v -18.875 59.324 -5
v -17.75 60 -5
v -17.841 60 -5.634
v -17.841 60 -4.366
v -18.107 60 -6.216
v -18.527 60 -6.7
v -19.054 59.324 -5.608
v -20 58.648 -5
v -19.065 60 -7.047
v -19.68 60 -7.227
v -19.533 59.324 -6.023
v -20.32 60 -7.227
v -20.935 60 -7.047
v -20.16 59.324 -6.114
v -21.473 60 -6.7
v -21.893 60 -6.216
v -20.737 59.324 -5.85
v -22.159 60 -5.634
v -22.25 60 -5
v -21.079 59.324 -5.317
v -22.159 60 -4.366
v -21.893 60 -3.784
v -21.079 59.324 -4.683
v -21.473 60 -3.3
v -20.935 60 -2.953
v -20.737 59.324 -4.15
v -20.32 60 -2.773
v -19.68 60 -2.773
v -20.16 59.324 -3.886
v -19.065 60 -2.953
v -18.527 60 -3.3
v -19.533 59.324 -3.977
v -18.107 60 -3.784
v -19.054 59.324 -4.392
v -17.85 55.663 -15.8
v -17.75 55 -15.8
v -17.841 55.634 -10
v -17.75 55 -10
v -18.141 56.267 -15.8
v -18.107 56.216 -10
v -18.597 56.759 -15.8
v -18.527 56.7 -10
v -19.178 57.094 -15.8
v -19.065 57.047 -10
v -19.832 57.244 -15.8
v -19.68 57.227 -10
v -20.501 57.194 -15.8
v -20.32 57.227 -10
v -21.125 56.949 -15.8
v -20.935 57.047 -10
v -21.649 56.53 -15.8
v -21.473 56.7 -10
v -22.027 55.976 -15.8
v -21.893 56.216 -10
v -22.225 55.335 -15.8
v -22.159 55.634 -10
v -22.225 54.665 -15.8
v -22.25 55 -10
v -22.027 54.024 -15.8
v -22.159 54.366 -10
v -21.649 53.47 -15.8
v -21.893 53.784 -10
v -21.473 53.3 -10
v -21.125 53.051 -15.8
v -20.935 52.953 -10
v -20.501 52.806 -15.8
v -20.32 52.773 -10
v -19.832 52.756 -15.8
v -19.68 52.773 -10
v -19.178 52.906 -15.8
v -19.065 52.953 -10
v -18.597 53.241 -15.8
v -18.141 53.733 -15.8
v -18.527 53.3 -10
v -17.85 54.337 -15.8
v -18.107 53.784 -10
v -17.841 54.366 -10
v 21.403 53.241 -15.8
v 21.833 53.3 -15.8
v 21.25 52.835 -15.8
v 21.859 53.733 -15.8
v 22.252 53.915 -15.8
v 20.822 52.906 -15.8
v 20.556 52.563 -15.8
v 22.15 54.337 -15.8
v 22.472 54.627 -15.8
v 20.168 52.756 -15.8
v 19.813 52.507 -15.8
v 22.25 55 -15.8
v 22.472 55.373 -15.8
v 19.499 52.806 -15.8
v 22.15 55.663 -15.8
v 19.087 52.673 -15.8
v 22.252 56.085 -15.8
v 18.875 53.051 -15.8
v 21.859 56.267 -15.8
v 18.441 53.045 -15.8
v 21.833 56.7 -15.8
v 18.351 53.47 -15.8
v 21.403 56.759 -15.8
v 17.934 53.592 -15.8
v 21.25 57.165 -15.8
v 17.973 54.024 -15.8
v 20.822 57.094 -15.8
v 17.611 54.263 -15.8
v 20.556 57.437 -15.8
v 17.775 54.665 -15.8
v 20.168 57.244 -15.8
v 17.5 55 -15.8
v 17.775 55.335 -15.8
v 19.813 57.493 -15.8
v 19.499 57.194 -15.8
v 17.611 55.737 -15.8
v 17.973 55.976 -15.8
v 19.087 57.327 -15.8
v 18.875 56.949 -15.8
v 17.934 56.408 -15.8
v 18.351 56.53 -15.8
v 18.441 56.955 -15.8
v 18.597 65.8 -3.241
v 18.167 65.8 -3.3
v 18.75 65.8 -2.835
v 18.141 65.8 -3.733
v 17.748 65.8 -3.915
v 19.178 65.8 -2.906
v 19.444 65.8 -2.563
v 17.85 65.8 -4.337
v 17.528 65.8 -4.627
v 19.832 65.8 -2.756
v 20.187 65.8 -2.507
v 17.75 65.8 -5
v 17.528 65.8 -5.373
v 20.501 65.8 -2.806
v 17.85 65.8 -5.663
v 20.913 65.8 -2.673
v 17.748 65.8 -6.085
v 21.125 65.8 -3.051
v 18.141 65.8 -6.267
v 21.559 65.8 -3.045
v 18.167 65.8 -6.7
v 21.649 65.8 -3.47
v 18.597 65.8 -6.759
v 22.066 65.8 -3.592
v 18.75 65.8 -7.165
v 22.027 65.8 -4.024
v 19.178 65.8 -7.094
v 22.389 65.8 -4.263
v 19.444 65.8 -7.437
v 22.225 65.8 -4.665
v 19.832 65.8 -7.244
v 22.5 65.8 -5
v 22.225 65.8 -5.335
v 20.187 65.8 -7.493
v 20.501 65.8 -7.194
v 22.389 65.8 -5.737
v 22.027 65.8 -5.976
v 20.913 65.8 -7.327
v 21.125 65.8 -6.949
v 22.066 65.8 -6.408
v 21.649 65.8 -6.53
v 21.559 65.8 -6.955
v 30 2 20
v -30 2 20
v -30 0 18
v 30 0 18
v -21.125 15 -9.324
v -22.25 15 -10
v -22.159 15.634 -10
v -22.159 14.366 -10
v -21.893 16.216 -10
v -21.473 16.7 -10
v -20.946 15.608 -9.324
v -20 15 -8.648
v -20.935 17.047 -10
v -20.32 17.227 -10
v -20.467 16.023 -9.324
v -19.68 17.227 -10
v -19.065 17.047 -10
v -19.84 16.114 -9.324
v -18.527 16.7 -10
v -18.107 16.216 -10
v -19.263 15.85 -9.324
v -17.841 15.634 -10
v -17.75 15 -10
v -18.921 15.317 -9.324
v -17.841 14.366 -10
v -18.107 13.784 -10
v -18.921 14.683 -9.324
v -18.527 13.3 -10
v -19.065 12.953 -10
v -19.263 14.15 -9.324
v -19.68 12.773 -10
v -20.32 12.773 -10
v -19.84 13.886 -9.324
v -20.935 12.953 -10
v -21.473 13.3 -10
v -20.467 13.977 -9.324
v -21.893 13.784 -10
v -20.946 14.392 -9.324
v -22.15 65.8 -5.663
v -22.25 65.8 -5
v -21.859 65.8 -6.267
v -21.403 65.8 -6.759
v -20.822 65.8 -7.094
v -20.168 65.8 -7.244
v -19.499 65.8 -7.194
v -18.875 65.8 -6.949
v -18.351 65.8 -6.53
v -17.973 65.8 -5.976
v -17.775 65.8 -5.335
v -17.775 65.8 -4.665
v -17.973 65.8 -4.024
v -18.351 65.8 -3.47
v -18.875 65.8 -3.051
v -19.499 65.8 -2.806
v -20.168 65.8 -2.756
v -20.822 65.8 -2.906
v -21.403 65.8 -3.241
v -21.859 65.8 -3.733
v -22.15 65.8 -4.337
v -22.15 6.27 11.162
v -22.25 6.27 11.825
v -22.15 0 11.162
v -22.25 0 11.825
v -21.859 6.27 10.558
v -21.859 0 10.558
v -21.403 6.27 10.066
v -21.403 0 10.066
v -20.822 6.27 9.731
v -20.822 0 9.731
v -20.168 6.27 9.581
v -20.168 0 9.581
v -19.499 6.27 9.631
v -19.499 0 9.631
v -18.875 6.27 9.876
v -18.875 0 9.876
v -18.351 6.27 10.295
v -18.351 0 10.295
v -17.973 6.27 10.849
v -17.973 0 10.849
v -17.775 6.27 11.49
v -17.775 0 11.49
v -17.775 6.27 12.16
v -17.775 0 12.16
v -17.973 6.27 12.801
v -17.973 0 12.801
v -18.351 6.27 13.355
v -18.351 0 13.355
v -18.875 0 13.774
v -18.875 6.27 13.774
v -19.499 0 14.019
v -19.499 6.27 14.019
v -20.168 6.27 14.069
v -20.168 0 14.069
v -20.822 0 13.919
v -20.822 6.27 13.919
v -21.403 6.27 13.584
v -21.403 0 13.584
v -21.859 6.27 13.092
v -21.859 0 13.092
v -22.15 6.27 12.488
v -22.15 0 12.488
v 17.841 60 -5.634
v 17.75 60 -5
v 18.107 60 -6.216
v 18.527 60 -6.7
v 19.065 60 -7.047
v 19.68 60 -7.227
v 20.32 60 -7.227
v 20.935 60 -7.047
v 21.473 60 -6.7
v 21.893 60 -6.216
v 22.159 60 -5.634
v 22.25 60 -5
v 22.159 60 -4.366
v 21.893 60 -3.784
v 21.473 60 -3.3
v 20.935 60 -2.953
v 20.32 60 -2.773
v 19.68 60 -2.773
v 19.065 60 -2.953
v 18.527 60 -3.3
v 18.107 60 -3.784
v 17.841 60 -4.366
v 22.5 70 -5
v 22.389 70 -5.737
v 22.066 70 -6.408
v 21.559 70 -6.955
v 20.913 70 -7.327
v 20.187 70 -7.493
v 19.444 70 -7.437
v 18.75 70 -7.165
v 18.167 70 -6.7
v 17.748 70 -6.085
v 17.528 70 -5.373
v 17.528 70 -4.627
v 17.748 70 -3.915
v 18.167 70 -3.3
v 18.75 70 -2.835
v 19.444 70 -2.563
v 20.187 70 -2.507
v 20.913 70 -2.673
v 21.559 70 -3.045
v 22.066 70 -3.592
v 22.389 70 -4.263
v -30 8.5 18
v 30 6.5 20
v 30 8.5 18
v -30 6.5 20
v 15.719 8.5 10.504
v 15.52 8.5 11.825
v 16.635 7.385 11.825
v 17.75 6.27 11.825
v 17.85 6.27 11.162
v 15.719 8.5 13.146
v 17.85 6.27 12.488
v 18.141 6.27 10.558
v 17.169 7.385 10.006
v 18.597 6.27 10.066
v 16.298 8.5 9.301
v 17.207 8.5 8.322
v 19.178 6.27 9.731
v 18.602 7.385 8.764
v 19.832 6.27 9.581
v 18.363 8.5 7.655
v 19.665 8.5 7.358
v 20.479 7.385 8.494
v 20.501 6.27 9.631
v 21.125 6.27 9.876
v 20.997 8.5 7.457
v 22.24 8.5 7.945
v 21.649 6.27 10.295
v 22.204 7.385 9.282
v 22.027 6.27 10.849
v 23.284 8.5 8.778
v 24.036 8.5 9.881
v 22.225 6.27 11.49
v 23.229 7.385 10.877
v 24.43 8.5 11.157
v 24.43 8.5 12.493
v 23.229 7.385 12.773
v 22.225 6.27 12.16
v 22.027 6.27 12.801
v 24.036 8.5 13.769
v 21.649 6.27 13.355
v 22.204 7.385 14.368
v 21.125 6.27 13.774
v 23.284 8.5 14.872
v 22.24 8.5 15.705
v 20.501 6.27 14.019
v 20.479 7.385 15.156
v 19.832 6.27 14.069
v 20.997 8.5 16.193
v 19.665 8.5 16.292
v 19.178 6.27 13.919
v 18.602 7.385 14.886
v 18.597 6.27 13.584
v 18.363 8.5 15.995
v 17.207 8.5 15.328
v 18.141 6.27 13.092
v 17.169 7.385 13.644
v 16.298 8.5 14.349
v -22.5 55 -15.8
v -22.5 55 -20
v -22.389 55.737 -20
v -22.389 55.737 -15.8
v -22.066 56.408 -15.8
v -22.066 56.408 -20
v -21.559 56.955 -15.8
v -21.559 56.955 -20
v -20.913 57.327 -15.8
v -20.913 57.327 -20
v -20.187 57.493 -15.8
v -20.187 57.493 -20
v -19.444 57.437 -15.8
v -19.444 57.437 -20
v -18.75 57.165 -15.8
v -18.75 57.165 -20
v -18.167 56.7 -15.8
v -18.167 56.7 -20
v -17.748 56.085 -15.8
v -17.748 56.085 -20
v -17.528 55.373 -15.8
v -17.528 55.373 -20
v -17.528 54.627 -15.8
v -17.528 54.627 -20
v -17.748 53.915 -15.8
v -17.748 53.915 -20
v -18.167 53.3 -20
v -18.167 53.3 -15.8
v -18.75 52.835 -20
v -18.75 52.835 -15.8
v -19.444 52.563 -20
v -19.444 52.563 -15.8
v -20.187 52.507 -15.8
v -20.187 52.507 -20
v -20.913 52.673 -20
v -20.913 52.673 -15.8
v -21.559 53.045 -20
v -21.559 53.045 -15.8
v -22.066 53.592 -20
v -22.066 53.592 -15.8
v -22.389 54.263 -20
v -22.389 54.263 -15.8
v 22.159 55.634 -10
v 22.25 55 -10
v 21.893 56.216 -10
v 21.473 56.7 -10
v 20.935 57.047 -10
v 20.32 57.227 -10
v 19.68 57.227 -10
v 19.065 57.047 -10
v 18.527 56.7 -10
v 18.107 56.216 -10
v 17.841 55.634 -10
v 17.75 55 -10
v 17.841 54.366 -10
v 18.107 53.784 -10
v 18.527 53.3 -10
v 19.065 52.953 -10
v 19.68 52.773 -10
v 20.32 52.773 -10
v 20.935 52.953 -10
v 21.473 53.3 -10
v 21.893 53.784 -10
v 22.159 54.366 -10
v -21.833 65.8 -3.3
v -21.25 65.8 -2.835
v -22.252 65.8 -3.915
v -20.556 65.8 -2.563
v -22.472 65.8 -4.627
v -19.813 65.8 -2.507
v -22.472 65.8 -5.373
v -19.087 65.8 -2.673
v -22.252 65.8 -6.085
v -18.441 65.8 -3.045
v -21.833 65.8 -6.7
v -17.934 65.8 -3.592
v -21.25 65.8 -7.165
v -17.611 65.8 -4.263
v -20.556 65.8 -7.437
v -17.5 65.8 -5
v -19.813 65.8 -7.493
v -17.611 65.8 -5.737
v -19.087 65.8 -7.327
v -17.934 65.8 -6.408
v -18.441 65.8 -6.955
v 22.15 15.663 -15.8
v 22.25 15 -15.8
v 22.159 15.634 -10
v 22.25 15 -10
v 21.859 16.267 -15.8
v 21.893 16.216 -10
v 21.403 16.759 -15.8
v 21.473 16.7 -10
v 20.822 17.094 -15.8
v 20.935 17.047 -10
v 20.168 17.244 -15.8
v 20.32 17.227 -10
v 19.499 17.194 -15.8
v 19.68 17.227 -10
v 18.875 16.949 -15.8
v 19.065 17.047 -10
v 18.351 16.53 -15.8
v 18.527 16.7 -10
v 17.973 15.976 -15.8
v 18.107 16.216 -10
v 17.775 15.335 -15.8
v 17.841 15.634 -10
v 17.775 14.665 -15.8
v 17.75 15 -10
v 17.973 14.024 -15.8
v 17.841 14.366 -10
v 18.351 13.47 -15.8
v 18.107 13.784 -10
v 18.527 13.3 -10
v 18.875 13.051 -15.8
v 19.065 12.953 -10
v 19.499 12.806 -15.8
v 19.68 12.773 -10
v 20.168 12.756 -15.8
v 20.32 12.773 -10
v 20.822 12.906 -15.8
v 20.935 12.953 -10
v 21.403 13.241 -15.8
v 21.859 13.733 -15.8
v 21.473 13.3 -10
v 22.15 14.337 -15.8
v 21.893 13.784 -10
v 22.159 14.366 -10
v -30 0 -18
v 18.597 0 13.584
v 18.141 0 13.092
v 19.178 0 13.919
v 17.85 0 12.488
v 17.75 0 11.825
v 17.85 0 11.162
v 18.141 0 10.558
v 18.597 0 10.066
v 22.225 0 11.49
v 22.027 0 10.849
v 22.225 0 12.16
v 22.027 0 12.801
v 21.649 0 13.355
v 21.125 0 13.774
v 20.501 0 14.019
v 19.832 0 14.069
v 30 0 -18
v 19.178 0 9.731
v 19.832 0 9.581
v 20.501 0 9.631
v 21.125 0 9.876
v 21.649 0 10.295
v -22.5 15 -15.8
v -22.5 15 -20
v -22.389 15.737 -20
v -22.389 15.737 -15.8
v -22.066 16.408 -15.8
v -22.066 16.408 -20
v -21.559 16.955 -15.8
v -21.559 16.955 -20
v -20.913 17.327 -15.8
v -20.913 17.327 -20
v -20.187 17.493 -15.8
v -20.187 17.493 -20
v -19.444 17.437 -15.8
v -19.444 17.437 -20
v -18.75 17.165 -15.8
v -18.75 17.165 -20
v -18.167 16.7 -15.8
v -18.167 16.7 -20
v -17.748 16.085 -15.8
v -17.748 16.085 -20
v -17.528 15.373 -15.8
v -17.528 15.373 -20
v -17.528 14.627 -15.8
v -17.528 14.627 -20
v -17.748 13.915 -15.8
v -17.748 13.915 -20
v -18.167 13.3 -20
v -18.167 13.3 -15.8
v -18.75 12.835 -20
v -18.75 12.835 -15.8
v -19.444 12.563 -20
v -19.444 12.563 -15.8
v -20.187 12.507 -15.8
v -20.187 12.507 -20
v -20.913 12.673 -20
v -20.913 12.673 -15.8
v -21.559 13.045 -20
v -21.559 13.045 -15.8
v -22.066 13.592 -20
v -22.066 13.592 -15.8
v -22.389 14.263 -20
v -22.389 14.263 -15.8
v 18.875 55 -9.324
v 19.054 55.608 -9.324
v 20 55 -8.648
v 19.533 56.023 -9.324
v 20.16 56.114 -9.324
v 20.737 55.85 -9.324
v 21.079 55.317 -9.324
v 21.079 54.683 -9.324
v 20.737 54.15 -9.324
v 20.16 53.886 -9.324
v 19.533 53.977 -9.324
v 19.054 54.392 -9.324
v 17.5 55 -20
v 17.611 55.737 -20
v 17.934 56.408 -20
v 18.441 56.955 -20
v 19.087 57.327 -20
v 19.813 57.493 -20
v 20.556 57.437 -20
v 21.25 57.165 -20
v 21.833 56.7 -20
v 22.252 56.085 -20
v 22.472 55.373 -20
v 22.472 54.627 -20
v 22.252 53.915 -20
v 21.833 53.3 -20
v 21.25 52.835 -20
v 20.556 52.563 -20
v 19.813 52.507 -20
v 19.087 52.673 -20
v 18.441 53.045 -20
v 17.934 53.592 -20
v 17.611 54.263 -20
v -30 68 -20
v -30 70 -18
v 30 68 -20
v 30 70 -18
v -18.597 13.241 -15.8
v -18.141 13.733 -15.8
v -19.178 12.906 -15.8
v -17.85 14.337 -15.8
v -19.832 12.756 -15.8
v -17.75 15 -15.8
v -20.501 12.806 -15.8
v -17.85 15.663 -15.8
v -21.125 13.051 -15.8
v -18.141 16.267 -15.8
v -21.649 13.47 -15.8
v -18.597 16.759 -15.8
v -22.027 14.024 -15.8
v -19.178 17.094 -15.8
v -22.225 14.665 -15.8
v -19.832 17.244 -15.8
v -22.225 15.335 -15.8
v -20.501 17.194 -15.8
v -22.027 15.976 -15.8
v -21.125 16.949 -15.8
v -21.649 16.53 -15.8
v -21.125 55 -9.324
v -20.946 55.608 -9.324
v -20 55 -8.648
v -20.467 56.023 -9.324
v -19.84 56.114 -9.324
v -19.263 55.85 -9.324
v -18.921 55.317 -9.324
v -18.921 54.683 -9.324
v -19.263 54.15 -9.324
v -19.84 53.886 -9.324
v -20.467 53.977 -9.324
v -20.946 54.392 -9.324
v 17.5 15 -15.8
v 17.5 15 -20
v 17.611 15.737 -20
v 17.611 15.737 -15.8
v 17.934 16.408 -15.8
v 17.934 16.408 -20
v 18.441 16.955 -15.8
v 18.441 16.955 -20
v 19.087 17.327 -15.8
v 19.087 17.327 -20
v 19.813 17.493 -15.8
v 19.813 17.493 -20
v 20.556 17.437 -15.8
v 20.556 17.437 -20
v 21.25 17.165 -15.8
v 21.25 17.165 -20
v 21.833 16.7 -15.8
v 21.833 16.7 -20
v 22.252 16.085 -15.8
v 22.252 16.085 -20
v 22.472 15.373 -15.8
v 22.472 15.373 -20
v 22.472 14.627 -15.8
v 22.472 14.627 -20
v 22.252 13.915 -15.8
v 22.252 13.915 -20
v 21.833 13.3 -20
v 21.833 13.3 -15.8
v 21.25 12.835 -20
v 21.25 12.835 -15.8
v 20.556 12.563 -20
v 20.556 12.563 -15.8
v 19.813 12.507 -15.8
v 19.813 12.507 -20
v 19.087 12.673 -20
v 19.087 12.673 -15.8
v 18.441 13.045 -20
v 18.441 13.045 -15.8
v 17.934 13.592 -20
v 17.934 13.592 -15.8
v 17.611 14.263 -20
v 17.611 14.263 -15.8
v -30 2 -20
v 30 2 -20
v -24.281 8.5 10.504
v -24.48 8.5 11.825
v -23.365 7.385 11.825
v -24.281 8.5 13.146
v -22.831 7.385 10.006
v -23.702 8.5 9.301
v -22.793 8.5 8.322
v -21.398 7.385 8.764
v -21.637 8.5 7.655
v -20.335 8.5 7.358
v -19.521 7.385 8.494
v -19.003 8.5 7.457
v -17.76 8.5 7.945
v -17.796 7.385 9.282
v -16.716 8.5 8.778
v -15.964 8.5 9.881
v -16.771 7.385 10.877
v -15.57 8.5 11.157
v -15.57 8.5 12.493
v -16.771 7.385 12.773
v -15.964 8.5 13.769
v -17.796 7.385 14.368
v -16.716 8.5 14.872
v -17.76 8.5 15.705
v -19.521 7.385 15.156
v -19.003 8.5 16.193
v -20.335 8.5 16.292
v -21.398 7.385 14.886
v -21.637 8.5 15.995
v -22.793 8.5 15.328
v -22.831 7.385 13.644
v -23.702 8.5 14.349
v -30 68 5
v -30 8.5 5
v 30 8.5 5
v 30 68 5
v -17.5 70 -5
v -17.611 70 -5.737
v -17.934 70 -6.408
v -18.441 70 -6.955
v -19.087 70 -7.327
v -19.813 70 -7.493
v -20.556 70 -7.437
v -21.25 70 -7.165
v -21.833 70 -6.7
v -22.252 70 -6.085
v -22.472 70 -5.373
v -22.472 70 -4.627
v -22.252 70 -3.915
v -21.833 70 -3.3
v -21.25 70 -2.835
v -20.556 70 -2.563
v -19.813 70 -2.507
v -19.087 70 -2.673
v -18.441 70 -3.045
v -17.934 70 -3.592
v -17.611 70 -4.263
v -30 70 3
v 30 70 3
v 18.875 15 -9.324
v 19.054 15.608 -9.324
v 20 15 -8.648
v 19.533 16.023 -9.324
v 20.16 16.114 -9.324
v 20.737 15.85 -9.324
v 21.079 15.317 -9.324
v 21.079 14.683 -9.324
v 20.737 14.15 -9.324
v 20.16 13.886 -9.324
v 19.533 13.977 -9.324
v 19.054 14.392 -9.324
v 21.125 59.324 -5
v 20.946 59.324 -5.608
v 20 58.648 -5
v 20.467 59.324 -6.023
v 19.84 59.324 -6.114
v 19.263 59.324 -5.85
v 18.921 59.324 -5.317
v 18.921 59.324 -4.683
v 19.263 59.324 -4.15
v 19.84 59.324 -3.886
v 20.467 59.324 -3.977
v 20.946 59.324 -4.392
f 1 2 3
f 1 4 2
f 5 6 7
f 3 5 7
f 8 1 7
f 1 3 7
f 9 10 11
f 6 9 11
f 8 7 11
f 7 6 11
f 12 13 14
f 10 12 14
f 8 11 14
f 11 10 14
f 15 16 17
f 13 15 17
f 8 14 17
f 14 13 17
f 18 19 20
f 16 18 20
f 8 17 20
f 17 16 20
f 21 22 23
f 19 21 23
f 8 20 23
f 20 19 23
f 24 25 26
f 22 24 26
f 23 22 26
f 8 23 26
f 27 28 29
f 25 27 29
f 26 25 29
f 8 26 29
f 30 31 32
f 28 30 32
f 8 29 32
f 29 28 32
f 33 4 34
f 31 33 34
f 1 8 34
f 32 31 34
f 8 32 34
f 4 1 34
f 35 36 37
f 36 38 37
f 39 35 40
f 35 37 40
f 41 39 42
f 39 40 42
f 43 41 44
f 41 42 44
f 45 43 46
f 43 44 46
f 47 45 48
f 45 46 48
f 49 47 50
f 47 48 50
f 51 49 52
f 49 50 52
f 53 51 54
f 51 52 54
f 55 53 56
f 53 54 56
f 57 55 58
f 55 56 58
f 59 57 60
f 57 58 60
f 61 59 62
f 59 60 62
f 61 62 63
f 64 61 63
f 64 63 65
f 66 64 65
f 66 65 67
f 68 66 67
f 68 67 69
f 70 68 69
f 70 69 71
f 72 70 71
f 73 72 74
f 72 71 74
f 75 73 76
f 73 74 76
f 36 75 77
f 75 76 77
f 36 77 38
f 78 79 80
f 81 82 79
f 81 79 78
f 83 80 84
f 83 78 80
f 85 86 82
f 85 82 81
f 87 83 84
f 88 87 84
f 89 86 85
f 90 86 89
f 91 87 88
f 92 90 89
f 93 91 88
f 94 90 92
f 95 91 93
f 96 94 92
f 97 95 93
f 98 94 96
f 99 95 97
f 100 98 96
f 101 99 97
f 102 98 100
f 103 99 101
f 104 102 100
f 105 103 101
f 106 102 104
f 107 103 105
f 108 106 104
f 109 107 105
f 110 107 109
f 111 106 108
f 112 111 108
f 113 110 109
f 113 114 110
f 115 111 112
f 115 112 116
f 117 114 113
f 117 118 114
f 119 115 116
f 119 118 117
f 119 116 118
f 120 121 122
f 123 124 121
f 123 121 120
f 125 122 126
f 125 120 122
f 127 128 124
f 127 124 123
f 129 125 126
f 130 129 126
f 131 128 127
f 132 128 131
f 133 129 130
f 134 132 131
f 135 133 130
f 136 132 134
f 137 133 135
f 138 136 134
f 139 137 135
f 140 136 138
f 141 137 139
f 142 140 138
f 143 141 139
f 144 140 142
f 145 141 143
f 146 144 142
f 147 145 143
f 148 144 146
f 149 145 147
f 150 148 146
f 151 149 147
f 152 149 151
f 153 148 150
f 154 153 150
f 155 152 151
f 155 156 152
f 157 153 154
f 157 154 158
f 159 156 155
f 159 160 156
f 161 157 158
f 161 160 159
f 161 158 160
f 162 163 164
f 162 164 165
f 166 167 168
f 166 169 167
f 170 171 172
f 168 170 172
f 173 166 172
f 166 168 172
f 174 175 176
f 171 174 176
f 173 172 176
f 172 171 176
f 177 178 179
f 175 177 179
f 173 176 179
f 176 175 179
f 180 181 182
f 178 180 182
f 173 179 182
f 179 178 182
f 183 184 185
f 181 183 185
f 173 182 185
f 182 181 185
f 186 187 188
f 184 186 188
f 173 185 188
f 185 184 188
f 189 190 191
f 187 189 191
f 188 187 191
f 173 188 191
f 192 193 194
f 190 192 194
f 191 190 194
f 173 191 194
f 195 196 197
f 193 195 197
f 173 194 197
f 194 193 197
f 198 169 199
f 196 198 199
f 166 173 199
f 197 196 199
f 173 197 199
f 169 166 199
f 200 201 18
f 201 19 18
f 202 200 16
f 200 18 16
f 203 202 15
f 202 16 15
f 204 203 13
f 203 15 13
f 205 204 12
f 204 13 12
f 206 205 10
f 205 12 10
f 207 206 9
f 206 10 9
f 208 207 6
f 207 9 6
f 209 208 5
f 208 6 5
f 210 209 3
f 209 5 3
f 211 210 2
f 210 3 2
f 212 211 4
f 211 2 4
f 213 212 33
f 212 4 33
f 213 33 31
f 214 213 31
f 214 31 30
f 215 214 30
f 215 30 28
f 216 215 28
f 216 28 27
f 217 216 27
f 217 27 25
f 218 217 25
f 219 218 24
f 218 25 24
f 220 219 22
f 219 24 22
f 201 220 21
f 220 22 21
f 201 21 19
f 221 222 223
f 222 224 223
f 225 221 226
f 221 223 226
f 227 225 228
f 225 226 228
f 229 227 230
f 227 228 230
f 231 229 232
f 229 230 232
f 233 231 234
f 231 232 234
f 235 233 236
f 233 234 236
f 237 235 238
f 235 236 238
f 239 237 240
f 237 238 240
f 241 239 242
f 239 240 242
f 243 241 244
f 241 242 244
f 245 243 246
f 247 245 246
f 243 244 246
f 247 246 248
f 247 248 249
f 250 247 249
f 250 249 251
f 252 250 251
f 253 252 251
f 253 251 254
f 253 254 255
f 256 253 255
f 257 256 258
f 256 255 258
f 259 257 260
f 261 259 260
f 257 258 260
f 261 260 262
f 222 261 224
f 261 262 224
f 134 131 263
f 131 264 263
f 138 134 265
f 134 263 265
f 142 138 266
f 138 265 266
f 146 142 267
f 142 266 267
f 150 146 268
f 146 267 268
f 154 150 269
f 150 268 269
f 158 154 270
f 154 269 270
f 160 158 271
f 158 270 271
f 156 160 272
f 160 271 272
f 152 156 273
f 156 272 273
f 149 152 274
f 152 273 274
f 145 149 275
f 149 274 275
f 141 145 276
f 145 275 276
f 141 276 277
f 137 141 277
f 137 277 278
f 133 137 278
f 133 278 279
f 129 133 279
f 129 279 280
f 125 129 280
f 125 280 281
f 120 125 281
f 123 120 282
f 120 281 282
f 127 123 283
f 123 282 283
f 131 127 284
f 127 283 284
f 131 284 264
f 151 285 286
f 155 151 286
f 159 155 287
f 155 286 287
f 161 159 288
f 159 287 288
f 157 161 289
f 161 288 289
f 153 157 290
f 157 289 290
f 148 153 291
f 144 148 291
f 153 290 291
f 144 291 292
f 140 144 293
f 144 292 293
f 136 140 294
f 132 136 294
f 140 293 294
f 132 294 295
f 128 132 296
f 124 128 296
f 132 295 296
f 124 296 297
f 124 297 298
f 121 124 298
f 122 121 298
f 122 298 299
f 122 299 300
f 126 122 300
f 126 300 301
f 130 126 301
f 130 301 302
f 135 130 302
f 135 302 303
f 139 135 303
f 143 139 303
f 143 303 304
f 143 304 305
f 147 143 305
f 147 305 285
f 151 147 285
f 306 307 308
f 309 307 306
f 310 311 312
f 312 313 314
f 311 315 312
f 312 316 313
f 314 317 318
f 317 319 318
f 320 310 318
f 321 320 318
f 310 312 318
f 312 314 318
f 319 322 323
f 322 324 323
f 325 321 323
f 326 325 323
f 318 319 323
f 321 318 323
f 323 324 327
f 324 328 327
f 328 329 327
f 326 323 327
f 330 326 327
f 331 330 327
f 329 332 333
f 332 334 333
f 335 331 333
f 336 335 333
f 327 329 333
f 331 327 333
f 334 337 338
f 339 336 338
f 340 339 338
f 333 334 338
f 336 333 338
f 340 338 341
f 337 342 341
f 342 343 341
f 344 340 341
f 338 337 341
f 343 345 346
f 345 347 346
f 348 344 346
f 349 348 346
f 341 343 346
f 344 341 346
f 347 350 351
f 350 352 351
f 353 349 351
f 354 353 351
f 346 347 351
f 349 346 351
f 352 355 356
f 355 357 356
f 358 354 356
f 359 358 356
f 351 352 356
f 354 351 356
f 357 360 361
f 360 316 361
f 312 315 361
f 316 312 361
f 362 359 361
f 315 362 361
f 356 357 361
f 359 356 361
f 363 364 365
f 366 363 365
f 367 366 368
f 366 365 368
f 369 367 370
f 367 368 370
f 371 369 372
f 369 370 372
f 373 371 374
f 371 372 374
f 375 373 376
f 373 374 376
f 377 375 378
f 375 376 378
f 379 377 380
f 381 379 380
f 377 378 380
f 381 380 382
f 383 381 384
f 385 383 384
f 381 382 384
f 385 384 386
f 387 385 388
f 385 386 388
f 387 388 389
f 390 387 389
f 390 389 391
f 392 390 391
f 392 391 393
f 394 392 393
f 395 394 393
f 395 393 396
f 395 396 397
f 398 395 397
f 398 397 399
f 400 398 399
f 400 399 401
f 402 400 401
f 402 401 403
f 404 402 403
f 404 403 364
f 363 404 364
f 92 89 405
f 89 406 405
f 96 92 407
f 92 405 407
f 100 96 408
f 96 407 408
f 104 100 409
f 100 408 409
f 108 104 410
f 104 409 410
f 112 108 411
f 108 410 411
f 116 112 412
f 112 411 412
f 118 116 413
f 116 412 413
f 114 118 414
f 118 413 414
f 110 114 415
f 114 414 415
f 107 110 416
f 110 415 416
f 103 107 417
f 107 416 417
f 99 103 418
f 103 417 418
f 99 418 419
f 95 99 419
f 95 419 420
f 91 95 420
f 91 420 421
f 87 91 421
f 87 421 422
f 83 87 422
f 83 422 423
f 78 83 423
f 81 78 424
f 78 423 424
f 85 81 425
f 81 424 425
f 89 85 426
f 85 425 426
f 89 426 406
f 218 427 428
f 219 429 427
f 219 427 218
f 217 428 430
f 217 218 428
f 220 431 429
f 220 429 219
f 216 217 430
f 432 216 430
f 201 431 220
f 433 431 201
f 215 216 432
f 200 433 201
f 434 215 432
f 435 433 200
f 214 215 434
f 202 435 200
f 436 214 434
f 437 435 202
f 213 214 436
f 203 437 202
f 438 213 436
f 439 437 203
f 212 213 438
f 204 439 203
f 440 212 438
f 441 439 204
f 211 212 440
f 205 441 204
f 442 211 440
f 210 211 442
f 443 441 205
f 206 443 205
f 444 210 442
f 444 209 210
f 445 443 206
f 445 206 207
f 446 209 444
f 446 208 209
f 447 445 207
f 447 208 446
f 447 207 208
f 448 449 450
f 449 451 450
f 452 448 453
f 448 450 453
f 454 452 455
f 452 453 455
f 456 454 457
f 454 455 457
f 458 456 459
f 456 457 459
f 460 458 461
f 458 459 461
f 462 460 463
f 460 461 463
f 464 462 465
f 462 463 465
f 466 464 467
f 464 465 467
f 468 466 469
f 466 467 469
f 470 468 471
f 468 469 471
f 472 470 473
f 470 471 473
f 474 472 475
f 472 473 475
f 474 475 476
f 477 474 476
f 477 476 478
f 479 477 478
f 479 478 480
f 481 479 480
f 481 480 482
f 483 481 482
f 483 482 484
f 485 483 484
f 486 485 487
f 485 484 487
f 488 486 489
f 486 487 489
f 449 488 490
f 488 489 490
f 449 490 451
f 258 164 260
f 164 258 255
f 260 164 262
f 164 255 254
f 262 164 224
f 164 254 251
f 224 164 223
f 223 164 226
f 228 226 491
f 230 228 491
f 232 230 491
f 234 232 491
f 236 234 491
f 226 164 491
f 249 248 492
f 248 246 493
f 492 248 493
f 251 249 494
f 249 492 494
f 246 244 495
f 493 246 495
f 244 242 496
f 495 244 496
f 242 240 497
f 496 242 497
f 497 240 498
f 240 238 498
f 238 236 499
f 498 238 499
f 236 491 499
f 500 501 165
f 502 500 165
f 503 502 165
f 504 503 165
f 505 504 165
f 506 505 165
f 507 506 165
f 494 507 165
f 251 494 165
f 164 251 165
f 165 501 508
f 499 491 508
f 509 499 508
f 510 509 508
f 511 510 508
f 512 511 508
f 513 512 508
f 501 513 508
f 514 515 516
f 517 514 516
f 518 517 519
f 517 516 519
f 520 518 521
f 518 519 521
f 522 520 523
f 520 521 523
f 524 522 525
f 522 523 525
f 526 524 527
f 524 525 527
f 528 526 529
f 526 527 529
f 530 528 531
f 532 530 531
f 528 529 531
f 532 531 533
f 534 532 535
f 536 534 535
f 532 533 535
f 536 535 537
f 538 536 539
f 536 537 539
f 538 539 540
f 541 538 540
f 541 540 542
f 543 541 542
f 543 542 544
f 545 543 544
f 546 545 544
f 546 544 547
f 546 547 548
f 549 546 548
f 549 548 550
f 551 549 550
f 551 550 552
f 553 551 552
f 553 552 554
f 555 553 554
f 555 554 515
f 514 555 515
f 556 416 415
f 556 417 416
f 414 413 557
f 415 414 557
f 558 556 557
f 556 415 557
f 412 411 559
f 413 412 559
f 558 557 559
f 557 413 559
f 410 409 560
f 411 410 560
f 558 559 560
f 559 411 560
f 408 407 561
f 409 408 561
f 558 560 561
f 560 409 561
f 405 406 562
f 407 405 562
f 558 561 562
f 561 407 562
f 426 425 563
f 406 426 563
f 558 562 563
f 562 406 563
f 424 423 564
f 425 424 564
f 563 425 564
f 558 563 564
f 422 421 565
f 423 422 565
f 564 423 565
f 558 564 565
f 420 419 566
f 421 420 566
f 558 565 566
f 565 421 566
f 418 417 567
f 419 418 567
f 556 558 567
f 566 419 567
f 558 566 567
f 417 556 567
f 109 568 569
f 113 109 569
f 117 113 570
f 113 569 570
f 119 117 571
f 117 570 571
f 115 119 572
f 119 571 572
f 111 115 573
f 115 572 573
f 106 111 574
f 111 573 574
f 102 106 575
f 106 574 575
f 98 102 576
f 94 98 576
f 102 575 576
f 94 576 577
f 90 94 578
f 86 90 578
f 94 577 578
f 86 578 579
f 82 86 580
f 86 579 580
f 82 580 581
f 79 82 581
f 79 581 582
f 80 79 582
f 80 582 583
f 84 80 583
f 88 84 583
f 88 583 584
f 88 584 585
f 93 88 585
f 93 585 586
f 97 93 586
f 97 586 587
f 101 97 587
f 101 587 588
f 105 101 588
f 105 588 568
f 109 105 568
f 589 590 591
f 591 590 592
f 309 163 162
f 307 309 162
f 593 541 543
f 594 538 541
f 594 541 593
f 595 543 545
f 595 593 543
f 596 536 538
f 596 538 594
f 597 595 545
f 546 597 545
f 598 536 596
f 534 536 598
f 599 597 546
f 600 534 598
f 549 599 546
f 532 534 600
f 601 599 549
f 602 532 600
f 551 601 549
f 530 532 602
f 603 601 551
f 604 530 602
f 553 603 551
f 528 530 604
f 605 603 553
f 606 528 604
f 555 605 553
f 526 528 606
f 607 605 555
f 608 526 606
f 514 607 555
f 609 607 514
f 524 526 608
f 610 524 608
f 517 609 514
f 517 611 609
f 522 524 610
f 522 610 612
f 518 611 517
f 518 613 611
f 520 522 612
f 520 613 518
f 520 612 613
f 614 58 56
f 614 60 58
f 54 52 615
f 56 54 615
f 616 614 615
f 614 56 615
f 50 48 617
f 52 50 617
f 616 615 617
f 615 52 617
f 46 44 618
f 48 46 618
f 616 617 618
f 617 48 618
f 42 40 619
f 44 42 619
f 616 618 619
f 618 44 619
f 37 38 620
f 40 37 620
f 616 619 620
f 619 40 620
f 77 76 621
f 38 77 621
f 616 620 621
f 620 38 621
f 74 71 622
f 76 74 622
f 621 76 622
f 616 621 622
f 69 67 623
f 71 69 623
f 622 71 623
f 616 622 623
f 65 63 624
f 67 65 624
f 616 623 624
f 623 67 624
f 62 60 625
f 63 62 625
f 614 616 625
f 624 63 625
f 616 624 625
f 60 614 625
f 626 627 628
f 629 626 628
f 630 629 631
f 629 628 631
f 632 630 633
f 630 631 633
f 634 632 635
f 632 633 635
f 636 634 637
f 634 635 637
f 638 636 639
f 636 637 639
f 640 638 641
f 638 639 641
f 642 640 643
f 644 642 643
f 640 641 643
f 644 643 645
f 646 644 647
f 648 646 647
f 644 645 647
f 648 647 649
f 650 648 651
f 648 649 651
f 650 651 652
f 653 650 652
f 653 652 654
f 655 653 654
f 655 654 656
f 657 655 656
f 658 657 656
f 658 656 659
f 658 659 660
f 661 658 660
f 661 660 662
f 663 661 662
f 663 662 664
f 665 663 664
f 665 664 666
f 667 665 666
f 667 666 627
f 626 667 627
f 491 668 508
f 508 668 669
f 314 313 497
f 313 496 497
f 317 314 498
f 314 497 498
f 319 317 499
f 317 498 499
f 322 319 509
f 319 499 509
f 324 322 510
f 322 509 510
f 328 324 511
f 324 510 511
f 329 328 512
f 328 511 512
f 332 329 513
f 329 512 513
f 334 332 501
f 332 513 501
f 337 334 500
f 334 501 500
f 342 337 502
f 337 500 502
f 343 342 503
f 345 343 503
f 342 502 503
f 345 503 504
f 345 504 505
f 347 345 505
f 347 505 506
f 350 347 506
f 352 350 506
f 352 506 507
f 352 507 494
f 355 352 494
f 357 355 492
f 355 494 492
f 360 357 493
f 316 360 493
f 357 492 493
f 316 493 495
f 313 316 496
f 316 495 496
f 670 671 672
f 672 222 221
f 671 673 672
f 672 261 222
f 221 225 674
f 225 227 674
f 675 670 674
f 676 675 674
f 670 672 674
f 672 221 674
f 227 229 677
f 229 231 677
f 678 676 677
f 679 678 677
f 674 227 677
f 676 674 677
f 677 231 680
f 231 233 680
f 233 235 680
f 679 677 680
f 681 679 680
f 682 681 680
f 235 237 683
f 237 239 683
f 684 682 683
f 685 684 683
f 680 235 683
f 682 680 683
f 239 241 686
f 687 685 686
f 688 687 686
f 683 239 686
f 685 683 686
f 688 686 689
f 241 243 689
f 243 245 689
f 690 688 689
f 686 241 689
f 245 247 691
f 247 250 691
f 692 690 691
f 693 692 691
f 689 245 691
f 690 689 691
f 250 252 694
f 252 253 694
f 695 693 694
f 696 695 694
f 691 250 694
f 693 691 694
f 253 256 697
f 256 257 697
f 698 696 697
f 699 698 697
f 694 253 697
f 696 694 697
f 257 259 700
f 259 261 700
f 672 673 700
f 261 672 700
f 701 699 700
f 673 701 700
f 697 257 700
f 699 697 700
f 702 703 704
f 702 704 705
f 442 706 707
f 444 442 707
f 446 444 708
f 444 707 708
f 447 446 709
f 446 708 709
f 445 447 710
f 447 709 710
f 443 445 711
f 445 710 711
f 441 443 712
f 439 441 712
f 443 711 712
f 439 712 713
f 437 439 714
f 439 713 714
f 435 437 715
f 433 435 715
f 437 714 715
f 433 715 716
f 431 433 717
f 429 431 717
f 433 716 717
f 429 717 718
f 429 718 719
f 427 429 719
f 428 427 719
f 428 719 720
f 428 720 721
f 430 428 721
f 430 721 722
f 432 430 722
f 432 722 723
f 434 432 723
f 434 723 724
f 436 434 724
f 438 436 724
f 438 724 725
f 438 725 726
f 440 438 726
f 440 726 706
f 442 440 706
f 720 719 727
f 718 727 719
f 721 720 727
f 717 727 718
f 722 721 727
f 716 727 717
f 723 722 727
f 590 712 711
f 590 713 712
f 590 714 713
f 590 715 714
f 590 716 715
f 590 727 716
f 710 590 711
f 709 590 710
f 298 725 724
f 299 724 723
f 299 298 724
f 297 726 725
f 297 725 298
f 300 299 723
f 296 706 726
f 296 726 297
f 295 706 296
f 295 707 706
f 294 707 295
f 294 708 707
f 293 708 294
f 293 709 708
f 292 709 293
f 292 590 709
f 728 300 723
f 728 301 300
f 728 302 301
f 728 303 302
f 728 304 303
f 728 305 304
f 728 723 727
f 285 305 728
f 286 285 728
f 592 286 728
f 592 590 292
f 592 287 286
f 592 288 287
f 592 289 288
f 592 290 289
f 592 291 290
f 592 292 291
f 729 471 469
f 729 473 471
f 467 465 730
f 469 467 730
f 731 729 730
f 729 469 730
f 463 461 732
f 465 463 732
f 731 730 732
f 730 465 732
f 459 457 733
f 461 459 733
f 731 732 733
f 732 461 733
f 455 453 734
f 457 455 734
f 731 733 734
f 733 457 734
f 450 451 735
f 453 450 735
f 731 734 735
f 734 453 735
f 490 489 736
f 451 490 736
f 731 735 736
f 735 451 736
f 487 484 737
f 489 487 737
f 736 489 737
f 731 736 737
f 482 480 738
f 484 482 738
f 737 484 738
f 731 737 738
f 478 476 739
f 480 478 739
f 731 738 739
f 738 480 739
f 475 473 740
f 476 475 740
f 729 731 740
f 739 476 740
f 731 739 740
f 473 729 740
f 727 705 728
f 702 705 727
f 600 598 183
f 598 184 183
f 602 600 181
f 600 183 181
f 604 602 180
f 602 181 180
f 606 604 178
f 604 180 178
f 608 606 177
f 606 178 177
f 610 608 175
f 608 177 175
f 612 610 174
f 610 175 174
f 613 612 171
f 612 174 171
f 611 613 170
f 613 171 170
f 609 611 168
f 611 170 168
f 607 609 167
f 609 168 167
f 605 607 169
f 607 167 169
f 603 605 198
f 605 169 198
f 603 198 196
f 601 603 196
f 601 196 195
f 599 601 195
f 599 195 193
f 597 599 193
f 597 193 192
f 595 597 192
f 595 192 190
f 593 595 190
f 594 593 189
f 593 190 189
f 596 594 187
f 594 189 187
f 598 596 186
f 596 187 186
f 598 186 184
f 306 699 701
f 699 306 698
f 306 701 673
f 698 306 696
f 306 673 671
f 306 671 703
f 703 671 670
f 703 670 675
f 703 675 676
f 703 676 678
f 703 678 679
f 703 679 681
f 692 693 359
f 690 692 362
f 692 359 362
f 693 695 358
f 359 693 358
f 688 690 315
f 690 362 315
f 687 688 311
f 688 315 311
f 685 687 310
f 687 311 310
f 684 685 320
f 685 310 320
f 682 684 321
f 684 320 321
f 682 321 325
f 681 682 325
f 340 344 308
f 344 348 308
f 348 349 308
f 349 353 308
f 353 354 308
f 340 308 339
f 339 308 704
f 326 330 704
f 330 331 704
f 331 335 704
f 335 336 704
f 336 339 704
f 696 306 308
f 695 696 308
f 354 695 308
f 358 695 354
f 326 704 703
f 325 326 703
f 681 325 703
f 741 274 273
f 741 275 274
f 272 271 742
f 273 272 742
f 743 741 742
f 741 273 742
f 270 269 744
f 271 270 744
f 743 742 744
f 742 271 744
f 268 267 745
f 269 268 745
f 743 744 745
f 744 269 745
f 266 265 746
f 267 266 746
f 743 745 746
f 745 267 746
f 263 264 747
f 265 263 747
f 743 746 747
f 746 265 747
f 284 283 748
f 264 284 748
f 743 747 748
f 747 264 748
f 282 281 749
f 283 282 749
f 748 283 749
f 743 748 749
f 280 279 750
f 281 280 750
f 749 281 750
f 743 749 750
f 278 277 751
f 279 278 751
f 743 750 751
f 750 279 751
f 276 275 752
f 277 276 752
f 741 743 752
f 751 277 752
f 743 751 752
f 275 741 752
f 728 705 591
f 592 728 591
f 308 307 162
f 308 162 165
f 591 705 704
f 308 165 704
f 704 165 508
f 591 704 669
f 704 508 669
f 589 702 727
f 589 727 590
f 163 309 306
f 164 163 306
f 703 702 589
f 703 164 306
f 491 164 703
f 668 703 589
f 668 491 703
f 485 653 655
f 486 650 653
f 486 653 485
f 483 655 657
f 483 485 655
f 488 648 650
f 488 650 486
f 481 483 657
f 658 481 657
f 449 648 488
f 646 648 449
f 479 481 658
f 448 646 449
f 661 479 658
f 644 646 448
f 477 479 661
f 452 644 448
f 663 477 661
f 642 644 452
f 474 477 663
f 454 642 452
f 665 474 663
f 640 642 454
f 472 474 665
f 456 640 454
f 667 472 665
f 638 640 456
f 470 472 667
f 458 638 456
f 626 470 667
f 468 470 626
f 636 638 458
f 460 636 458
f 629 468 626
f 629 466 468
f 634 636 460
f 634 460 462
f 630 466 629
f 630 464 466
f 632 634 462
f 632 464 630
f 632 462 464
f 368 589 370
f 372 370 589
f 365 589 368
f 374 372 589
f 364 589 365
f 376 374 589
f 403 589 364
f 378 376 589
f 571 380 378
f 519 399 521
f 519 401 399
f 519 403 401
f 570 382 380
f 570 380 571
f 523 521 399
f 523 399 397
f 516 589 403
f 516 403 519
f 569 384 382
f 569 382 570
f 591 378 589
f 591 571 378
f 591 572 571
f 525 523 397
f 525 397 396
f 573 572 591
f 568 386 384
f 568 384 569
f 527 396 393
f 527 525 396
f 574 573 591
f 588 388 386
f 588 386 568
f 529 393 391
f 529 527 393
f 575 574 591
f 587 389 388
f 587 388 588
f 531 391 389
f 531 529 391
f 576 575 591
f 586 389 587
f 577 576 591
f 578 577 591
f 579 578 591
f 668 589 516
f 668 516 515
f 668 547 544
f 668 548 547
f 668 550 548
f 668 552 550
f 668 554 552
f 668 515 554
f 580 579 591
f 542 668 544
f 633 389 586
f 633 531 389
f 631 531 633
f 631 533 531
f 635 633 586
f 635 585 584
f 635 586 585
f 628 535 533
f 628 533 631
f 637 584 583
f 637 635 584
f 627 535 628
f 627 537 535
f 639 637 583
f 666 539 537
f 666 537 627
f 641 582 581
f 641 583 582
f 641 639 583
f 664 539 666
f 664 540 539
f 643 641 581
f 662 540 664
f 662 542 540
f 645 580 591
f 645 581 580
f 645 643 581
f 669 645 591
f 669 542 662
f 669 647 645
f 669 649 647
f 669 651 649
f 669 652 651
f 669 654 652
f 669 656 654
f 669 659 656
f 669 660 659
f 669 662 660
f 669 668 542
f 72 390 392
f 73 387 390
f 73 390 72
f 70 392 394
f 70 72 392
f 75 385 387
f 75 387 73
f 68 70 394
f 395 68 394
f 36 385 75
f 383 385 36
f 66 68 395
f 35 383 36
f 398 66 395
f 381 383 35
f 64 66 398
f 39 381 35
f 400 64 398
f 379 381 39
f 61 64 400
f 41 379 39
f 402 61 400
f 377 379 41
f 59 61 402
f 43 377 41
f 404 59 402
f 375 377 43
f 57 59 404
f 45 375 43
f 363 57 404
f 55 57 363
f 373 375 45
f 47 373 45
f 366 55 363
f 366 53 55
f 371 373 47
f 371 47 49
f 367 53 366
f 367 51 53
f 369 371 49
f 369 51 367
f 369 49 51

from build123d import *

# Parameters (mm, degrees)
SKETCH1_W                               = 60
SKETCH1_H                               = 40
BOSS_EXTRUDE1_DEPTH                     = 70
SKETCH2_W                               = 15
SKETCH2_H                               = 61.5
CUT_EXTRUDE1_DEPTH                      = 90
CSK_FOR_M4_SFHCS1_D                     = 4.5
CSK_FOR_M4_SFHCS1_CSINK_D               = 8.96
CSK_FOR_M4_SFHCS1_CSINK_ANGLE           = 90
CBORE_FOR_M5_HEX_HEAD_BOLT1_D           = 4.5
CBORE_FOR_M5_HEX_HEAD_BOLT1_DEPTH       = 10
CBORE_FOR_M5_HEX_HEAD_BOLT1_CBORE_D     = 5
CBORE_FOR_M5_HEX_HEAD_BOLT1_CBORE_DEPTH = 4.2
CBORE_FOR_M5_HEX_HEAD_BOLT1_TIP         = 1.351936393
CBORE_FOR_M5_HEX_HEAD_BOLT2_D           = 4.5
CBORE_FOR_M5_HEX_HEAD_BOLT2_DEPTH       = 10
CBORE_FOR_M5_HEX_HEAD_BOLT2_CBORE_D     = 5
CBORE_FOR_M5_HEX_HEAD_BOLT2_CBORE_DEPTH = 4.2
CBORE_FOR_M5_HEX_HEAD_BOLT2_TIP         = 1.351936393
CHAMFER2_SIZE                           = 2


with BuildPart() as part:
    # Sketch1 → Boss-Extrude1 (new body)
    with BuildSketch(Plane(origin=(0, 0, 0), x_dir=(1, 0, 0), z_dir=(0, 1, 0))):
        Rectangle(SKETCH1_W, SKETCH1_H)
    extrude(amount=BOSS_EXTRUDE1_DEPTH)

    # Sketch2 → Cut-Extrude1 (cut)
    with BuildSketch(Plane(origin=(30, 0, 0), x_dir=(0, 0, -1), z_dir=(1, 0, 0))):
        with Locations((-12.5, 39.25)):
            Rectangle(SKETCH2_W, SKETCH2_H)
    extrude(amount=-CUT_EXTRUDE1_DEPTH, mode=Mode.SUBTRACT)

    # CSK for M4 SFHCS1 (through all)
    with Locations(Plane(origin=(0, 8.5, 0), x_dir=(1, 0, 0), z_dir=(0, 1, 0))):
        with Locations((-20, -11.825), (20, -11.825)):
            CounterSinkHole(CSK_FOR_M4_SFHCS1_D / 2, CSK_FOR_M4_SFHCS1_CSINK_D / 2, counter_sink_angle=CSK_FOR_M4_SFHCS1_CSINK_ANGLE)

    # CBORE for M5 Hex Head Bolt1
    with Locations(Plane(origin=(0, 0, -20), x_dir=(-1, 0, 0), z_dir=(0, 0, -1))):
        with Locations((20, 55), (-20, 15), (-20, 55), (20, 15)):
            CounterBoreHole(CBORE_FOR_M5_HEX_HEAD_BOLT1_D / 2, CBORE_FOR_M5_HEX_HEAD_BOLT1_CBORE_D / 2, CBORE_FOR_M5_HEX_HEAD_BOLT1_CBORE_DEPTH, depth=CBORE_FOR_M5_HEX_HEAD_BOLT1_DEPTH)
            with Locations((0, 0, -(CBORE_FOR_M5_HEX_HEAD_BOLT1_DEPTH + CBORE_FOR_M5_HEX_HEAD_BOLT1_TIP / 2))):  # 118° drill point
                Cone(0, CBORE_FOR_M5_HEX_HEAD_BOLT1_D / 2, CBORE_FOR_M5_HEX_HEAD_BOLT1_TIP, mode=Mode.SUBTRACT)

    # CBORE for M5 Hex Head Bolt2
    with Locations(Plane(origin=(0, 70, 0), x_dir=(1, 0, 0), z_dir=(0, 1, 0))):
        with Locations((-20, 5), (20, 5)):
            CounterBoreHole(CBORE_FOR_M5_HEX_HEAD_BOLT2_D / 2, CBORE_FOR_M5_HEX_HEAD_BOLT2_CBORE_D / 2, CBORE_FOR_M5_HEX_HEAD_BOLT2_CBORE_DEPTH, depth=CBORE_FOR_M5_HEX_HEAD_BOLT2_DEPTH)
            with Locations((0, 0, -(CBORE_FOR_M5_HEX_HEAD_BOLT2_DEPTH + CBORE_FOR_M5_HEX_HEAD_BOLT2_TIP / 2))):  # 118° drill point
                Cone(0, CBORE_FOR_M5_HEX_HEAD_BOLT2_D / 2, CBORE_FOR_M5_HEX_HEAD_BOLT2_TIP, mode=Mode.SUBTRACT)

    # Chamfer2
    chamfer2_edges = [part.edges().sort_by_distance(p)[0] for p in [
        (0, 70, 5),
        (0, 8.5, 20),
        (0, 0, 20),
        (0, 0, -20),
        (0, 70, -20),
    ]]
    chamfer(chamfer2_edges, length=CHAMFER2_SIZE)


solid = part.part
